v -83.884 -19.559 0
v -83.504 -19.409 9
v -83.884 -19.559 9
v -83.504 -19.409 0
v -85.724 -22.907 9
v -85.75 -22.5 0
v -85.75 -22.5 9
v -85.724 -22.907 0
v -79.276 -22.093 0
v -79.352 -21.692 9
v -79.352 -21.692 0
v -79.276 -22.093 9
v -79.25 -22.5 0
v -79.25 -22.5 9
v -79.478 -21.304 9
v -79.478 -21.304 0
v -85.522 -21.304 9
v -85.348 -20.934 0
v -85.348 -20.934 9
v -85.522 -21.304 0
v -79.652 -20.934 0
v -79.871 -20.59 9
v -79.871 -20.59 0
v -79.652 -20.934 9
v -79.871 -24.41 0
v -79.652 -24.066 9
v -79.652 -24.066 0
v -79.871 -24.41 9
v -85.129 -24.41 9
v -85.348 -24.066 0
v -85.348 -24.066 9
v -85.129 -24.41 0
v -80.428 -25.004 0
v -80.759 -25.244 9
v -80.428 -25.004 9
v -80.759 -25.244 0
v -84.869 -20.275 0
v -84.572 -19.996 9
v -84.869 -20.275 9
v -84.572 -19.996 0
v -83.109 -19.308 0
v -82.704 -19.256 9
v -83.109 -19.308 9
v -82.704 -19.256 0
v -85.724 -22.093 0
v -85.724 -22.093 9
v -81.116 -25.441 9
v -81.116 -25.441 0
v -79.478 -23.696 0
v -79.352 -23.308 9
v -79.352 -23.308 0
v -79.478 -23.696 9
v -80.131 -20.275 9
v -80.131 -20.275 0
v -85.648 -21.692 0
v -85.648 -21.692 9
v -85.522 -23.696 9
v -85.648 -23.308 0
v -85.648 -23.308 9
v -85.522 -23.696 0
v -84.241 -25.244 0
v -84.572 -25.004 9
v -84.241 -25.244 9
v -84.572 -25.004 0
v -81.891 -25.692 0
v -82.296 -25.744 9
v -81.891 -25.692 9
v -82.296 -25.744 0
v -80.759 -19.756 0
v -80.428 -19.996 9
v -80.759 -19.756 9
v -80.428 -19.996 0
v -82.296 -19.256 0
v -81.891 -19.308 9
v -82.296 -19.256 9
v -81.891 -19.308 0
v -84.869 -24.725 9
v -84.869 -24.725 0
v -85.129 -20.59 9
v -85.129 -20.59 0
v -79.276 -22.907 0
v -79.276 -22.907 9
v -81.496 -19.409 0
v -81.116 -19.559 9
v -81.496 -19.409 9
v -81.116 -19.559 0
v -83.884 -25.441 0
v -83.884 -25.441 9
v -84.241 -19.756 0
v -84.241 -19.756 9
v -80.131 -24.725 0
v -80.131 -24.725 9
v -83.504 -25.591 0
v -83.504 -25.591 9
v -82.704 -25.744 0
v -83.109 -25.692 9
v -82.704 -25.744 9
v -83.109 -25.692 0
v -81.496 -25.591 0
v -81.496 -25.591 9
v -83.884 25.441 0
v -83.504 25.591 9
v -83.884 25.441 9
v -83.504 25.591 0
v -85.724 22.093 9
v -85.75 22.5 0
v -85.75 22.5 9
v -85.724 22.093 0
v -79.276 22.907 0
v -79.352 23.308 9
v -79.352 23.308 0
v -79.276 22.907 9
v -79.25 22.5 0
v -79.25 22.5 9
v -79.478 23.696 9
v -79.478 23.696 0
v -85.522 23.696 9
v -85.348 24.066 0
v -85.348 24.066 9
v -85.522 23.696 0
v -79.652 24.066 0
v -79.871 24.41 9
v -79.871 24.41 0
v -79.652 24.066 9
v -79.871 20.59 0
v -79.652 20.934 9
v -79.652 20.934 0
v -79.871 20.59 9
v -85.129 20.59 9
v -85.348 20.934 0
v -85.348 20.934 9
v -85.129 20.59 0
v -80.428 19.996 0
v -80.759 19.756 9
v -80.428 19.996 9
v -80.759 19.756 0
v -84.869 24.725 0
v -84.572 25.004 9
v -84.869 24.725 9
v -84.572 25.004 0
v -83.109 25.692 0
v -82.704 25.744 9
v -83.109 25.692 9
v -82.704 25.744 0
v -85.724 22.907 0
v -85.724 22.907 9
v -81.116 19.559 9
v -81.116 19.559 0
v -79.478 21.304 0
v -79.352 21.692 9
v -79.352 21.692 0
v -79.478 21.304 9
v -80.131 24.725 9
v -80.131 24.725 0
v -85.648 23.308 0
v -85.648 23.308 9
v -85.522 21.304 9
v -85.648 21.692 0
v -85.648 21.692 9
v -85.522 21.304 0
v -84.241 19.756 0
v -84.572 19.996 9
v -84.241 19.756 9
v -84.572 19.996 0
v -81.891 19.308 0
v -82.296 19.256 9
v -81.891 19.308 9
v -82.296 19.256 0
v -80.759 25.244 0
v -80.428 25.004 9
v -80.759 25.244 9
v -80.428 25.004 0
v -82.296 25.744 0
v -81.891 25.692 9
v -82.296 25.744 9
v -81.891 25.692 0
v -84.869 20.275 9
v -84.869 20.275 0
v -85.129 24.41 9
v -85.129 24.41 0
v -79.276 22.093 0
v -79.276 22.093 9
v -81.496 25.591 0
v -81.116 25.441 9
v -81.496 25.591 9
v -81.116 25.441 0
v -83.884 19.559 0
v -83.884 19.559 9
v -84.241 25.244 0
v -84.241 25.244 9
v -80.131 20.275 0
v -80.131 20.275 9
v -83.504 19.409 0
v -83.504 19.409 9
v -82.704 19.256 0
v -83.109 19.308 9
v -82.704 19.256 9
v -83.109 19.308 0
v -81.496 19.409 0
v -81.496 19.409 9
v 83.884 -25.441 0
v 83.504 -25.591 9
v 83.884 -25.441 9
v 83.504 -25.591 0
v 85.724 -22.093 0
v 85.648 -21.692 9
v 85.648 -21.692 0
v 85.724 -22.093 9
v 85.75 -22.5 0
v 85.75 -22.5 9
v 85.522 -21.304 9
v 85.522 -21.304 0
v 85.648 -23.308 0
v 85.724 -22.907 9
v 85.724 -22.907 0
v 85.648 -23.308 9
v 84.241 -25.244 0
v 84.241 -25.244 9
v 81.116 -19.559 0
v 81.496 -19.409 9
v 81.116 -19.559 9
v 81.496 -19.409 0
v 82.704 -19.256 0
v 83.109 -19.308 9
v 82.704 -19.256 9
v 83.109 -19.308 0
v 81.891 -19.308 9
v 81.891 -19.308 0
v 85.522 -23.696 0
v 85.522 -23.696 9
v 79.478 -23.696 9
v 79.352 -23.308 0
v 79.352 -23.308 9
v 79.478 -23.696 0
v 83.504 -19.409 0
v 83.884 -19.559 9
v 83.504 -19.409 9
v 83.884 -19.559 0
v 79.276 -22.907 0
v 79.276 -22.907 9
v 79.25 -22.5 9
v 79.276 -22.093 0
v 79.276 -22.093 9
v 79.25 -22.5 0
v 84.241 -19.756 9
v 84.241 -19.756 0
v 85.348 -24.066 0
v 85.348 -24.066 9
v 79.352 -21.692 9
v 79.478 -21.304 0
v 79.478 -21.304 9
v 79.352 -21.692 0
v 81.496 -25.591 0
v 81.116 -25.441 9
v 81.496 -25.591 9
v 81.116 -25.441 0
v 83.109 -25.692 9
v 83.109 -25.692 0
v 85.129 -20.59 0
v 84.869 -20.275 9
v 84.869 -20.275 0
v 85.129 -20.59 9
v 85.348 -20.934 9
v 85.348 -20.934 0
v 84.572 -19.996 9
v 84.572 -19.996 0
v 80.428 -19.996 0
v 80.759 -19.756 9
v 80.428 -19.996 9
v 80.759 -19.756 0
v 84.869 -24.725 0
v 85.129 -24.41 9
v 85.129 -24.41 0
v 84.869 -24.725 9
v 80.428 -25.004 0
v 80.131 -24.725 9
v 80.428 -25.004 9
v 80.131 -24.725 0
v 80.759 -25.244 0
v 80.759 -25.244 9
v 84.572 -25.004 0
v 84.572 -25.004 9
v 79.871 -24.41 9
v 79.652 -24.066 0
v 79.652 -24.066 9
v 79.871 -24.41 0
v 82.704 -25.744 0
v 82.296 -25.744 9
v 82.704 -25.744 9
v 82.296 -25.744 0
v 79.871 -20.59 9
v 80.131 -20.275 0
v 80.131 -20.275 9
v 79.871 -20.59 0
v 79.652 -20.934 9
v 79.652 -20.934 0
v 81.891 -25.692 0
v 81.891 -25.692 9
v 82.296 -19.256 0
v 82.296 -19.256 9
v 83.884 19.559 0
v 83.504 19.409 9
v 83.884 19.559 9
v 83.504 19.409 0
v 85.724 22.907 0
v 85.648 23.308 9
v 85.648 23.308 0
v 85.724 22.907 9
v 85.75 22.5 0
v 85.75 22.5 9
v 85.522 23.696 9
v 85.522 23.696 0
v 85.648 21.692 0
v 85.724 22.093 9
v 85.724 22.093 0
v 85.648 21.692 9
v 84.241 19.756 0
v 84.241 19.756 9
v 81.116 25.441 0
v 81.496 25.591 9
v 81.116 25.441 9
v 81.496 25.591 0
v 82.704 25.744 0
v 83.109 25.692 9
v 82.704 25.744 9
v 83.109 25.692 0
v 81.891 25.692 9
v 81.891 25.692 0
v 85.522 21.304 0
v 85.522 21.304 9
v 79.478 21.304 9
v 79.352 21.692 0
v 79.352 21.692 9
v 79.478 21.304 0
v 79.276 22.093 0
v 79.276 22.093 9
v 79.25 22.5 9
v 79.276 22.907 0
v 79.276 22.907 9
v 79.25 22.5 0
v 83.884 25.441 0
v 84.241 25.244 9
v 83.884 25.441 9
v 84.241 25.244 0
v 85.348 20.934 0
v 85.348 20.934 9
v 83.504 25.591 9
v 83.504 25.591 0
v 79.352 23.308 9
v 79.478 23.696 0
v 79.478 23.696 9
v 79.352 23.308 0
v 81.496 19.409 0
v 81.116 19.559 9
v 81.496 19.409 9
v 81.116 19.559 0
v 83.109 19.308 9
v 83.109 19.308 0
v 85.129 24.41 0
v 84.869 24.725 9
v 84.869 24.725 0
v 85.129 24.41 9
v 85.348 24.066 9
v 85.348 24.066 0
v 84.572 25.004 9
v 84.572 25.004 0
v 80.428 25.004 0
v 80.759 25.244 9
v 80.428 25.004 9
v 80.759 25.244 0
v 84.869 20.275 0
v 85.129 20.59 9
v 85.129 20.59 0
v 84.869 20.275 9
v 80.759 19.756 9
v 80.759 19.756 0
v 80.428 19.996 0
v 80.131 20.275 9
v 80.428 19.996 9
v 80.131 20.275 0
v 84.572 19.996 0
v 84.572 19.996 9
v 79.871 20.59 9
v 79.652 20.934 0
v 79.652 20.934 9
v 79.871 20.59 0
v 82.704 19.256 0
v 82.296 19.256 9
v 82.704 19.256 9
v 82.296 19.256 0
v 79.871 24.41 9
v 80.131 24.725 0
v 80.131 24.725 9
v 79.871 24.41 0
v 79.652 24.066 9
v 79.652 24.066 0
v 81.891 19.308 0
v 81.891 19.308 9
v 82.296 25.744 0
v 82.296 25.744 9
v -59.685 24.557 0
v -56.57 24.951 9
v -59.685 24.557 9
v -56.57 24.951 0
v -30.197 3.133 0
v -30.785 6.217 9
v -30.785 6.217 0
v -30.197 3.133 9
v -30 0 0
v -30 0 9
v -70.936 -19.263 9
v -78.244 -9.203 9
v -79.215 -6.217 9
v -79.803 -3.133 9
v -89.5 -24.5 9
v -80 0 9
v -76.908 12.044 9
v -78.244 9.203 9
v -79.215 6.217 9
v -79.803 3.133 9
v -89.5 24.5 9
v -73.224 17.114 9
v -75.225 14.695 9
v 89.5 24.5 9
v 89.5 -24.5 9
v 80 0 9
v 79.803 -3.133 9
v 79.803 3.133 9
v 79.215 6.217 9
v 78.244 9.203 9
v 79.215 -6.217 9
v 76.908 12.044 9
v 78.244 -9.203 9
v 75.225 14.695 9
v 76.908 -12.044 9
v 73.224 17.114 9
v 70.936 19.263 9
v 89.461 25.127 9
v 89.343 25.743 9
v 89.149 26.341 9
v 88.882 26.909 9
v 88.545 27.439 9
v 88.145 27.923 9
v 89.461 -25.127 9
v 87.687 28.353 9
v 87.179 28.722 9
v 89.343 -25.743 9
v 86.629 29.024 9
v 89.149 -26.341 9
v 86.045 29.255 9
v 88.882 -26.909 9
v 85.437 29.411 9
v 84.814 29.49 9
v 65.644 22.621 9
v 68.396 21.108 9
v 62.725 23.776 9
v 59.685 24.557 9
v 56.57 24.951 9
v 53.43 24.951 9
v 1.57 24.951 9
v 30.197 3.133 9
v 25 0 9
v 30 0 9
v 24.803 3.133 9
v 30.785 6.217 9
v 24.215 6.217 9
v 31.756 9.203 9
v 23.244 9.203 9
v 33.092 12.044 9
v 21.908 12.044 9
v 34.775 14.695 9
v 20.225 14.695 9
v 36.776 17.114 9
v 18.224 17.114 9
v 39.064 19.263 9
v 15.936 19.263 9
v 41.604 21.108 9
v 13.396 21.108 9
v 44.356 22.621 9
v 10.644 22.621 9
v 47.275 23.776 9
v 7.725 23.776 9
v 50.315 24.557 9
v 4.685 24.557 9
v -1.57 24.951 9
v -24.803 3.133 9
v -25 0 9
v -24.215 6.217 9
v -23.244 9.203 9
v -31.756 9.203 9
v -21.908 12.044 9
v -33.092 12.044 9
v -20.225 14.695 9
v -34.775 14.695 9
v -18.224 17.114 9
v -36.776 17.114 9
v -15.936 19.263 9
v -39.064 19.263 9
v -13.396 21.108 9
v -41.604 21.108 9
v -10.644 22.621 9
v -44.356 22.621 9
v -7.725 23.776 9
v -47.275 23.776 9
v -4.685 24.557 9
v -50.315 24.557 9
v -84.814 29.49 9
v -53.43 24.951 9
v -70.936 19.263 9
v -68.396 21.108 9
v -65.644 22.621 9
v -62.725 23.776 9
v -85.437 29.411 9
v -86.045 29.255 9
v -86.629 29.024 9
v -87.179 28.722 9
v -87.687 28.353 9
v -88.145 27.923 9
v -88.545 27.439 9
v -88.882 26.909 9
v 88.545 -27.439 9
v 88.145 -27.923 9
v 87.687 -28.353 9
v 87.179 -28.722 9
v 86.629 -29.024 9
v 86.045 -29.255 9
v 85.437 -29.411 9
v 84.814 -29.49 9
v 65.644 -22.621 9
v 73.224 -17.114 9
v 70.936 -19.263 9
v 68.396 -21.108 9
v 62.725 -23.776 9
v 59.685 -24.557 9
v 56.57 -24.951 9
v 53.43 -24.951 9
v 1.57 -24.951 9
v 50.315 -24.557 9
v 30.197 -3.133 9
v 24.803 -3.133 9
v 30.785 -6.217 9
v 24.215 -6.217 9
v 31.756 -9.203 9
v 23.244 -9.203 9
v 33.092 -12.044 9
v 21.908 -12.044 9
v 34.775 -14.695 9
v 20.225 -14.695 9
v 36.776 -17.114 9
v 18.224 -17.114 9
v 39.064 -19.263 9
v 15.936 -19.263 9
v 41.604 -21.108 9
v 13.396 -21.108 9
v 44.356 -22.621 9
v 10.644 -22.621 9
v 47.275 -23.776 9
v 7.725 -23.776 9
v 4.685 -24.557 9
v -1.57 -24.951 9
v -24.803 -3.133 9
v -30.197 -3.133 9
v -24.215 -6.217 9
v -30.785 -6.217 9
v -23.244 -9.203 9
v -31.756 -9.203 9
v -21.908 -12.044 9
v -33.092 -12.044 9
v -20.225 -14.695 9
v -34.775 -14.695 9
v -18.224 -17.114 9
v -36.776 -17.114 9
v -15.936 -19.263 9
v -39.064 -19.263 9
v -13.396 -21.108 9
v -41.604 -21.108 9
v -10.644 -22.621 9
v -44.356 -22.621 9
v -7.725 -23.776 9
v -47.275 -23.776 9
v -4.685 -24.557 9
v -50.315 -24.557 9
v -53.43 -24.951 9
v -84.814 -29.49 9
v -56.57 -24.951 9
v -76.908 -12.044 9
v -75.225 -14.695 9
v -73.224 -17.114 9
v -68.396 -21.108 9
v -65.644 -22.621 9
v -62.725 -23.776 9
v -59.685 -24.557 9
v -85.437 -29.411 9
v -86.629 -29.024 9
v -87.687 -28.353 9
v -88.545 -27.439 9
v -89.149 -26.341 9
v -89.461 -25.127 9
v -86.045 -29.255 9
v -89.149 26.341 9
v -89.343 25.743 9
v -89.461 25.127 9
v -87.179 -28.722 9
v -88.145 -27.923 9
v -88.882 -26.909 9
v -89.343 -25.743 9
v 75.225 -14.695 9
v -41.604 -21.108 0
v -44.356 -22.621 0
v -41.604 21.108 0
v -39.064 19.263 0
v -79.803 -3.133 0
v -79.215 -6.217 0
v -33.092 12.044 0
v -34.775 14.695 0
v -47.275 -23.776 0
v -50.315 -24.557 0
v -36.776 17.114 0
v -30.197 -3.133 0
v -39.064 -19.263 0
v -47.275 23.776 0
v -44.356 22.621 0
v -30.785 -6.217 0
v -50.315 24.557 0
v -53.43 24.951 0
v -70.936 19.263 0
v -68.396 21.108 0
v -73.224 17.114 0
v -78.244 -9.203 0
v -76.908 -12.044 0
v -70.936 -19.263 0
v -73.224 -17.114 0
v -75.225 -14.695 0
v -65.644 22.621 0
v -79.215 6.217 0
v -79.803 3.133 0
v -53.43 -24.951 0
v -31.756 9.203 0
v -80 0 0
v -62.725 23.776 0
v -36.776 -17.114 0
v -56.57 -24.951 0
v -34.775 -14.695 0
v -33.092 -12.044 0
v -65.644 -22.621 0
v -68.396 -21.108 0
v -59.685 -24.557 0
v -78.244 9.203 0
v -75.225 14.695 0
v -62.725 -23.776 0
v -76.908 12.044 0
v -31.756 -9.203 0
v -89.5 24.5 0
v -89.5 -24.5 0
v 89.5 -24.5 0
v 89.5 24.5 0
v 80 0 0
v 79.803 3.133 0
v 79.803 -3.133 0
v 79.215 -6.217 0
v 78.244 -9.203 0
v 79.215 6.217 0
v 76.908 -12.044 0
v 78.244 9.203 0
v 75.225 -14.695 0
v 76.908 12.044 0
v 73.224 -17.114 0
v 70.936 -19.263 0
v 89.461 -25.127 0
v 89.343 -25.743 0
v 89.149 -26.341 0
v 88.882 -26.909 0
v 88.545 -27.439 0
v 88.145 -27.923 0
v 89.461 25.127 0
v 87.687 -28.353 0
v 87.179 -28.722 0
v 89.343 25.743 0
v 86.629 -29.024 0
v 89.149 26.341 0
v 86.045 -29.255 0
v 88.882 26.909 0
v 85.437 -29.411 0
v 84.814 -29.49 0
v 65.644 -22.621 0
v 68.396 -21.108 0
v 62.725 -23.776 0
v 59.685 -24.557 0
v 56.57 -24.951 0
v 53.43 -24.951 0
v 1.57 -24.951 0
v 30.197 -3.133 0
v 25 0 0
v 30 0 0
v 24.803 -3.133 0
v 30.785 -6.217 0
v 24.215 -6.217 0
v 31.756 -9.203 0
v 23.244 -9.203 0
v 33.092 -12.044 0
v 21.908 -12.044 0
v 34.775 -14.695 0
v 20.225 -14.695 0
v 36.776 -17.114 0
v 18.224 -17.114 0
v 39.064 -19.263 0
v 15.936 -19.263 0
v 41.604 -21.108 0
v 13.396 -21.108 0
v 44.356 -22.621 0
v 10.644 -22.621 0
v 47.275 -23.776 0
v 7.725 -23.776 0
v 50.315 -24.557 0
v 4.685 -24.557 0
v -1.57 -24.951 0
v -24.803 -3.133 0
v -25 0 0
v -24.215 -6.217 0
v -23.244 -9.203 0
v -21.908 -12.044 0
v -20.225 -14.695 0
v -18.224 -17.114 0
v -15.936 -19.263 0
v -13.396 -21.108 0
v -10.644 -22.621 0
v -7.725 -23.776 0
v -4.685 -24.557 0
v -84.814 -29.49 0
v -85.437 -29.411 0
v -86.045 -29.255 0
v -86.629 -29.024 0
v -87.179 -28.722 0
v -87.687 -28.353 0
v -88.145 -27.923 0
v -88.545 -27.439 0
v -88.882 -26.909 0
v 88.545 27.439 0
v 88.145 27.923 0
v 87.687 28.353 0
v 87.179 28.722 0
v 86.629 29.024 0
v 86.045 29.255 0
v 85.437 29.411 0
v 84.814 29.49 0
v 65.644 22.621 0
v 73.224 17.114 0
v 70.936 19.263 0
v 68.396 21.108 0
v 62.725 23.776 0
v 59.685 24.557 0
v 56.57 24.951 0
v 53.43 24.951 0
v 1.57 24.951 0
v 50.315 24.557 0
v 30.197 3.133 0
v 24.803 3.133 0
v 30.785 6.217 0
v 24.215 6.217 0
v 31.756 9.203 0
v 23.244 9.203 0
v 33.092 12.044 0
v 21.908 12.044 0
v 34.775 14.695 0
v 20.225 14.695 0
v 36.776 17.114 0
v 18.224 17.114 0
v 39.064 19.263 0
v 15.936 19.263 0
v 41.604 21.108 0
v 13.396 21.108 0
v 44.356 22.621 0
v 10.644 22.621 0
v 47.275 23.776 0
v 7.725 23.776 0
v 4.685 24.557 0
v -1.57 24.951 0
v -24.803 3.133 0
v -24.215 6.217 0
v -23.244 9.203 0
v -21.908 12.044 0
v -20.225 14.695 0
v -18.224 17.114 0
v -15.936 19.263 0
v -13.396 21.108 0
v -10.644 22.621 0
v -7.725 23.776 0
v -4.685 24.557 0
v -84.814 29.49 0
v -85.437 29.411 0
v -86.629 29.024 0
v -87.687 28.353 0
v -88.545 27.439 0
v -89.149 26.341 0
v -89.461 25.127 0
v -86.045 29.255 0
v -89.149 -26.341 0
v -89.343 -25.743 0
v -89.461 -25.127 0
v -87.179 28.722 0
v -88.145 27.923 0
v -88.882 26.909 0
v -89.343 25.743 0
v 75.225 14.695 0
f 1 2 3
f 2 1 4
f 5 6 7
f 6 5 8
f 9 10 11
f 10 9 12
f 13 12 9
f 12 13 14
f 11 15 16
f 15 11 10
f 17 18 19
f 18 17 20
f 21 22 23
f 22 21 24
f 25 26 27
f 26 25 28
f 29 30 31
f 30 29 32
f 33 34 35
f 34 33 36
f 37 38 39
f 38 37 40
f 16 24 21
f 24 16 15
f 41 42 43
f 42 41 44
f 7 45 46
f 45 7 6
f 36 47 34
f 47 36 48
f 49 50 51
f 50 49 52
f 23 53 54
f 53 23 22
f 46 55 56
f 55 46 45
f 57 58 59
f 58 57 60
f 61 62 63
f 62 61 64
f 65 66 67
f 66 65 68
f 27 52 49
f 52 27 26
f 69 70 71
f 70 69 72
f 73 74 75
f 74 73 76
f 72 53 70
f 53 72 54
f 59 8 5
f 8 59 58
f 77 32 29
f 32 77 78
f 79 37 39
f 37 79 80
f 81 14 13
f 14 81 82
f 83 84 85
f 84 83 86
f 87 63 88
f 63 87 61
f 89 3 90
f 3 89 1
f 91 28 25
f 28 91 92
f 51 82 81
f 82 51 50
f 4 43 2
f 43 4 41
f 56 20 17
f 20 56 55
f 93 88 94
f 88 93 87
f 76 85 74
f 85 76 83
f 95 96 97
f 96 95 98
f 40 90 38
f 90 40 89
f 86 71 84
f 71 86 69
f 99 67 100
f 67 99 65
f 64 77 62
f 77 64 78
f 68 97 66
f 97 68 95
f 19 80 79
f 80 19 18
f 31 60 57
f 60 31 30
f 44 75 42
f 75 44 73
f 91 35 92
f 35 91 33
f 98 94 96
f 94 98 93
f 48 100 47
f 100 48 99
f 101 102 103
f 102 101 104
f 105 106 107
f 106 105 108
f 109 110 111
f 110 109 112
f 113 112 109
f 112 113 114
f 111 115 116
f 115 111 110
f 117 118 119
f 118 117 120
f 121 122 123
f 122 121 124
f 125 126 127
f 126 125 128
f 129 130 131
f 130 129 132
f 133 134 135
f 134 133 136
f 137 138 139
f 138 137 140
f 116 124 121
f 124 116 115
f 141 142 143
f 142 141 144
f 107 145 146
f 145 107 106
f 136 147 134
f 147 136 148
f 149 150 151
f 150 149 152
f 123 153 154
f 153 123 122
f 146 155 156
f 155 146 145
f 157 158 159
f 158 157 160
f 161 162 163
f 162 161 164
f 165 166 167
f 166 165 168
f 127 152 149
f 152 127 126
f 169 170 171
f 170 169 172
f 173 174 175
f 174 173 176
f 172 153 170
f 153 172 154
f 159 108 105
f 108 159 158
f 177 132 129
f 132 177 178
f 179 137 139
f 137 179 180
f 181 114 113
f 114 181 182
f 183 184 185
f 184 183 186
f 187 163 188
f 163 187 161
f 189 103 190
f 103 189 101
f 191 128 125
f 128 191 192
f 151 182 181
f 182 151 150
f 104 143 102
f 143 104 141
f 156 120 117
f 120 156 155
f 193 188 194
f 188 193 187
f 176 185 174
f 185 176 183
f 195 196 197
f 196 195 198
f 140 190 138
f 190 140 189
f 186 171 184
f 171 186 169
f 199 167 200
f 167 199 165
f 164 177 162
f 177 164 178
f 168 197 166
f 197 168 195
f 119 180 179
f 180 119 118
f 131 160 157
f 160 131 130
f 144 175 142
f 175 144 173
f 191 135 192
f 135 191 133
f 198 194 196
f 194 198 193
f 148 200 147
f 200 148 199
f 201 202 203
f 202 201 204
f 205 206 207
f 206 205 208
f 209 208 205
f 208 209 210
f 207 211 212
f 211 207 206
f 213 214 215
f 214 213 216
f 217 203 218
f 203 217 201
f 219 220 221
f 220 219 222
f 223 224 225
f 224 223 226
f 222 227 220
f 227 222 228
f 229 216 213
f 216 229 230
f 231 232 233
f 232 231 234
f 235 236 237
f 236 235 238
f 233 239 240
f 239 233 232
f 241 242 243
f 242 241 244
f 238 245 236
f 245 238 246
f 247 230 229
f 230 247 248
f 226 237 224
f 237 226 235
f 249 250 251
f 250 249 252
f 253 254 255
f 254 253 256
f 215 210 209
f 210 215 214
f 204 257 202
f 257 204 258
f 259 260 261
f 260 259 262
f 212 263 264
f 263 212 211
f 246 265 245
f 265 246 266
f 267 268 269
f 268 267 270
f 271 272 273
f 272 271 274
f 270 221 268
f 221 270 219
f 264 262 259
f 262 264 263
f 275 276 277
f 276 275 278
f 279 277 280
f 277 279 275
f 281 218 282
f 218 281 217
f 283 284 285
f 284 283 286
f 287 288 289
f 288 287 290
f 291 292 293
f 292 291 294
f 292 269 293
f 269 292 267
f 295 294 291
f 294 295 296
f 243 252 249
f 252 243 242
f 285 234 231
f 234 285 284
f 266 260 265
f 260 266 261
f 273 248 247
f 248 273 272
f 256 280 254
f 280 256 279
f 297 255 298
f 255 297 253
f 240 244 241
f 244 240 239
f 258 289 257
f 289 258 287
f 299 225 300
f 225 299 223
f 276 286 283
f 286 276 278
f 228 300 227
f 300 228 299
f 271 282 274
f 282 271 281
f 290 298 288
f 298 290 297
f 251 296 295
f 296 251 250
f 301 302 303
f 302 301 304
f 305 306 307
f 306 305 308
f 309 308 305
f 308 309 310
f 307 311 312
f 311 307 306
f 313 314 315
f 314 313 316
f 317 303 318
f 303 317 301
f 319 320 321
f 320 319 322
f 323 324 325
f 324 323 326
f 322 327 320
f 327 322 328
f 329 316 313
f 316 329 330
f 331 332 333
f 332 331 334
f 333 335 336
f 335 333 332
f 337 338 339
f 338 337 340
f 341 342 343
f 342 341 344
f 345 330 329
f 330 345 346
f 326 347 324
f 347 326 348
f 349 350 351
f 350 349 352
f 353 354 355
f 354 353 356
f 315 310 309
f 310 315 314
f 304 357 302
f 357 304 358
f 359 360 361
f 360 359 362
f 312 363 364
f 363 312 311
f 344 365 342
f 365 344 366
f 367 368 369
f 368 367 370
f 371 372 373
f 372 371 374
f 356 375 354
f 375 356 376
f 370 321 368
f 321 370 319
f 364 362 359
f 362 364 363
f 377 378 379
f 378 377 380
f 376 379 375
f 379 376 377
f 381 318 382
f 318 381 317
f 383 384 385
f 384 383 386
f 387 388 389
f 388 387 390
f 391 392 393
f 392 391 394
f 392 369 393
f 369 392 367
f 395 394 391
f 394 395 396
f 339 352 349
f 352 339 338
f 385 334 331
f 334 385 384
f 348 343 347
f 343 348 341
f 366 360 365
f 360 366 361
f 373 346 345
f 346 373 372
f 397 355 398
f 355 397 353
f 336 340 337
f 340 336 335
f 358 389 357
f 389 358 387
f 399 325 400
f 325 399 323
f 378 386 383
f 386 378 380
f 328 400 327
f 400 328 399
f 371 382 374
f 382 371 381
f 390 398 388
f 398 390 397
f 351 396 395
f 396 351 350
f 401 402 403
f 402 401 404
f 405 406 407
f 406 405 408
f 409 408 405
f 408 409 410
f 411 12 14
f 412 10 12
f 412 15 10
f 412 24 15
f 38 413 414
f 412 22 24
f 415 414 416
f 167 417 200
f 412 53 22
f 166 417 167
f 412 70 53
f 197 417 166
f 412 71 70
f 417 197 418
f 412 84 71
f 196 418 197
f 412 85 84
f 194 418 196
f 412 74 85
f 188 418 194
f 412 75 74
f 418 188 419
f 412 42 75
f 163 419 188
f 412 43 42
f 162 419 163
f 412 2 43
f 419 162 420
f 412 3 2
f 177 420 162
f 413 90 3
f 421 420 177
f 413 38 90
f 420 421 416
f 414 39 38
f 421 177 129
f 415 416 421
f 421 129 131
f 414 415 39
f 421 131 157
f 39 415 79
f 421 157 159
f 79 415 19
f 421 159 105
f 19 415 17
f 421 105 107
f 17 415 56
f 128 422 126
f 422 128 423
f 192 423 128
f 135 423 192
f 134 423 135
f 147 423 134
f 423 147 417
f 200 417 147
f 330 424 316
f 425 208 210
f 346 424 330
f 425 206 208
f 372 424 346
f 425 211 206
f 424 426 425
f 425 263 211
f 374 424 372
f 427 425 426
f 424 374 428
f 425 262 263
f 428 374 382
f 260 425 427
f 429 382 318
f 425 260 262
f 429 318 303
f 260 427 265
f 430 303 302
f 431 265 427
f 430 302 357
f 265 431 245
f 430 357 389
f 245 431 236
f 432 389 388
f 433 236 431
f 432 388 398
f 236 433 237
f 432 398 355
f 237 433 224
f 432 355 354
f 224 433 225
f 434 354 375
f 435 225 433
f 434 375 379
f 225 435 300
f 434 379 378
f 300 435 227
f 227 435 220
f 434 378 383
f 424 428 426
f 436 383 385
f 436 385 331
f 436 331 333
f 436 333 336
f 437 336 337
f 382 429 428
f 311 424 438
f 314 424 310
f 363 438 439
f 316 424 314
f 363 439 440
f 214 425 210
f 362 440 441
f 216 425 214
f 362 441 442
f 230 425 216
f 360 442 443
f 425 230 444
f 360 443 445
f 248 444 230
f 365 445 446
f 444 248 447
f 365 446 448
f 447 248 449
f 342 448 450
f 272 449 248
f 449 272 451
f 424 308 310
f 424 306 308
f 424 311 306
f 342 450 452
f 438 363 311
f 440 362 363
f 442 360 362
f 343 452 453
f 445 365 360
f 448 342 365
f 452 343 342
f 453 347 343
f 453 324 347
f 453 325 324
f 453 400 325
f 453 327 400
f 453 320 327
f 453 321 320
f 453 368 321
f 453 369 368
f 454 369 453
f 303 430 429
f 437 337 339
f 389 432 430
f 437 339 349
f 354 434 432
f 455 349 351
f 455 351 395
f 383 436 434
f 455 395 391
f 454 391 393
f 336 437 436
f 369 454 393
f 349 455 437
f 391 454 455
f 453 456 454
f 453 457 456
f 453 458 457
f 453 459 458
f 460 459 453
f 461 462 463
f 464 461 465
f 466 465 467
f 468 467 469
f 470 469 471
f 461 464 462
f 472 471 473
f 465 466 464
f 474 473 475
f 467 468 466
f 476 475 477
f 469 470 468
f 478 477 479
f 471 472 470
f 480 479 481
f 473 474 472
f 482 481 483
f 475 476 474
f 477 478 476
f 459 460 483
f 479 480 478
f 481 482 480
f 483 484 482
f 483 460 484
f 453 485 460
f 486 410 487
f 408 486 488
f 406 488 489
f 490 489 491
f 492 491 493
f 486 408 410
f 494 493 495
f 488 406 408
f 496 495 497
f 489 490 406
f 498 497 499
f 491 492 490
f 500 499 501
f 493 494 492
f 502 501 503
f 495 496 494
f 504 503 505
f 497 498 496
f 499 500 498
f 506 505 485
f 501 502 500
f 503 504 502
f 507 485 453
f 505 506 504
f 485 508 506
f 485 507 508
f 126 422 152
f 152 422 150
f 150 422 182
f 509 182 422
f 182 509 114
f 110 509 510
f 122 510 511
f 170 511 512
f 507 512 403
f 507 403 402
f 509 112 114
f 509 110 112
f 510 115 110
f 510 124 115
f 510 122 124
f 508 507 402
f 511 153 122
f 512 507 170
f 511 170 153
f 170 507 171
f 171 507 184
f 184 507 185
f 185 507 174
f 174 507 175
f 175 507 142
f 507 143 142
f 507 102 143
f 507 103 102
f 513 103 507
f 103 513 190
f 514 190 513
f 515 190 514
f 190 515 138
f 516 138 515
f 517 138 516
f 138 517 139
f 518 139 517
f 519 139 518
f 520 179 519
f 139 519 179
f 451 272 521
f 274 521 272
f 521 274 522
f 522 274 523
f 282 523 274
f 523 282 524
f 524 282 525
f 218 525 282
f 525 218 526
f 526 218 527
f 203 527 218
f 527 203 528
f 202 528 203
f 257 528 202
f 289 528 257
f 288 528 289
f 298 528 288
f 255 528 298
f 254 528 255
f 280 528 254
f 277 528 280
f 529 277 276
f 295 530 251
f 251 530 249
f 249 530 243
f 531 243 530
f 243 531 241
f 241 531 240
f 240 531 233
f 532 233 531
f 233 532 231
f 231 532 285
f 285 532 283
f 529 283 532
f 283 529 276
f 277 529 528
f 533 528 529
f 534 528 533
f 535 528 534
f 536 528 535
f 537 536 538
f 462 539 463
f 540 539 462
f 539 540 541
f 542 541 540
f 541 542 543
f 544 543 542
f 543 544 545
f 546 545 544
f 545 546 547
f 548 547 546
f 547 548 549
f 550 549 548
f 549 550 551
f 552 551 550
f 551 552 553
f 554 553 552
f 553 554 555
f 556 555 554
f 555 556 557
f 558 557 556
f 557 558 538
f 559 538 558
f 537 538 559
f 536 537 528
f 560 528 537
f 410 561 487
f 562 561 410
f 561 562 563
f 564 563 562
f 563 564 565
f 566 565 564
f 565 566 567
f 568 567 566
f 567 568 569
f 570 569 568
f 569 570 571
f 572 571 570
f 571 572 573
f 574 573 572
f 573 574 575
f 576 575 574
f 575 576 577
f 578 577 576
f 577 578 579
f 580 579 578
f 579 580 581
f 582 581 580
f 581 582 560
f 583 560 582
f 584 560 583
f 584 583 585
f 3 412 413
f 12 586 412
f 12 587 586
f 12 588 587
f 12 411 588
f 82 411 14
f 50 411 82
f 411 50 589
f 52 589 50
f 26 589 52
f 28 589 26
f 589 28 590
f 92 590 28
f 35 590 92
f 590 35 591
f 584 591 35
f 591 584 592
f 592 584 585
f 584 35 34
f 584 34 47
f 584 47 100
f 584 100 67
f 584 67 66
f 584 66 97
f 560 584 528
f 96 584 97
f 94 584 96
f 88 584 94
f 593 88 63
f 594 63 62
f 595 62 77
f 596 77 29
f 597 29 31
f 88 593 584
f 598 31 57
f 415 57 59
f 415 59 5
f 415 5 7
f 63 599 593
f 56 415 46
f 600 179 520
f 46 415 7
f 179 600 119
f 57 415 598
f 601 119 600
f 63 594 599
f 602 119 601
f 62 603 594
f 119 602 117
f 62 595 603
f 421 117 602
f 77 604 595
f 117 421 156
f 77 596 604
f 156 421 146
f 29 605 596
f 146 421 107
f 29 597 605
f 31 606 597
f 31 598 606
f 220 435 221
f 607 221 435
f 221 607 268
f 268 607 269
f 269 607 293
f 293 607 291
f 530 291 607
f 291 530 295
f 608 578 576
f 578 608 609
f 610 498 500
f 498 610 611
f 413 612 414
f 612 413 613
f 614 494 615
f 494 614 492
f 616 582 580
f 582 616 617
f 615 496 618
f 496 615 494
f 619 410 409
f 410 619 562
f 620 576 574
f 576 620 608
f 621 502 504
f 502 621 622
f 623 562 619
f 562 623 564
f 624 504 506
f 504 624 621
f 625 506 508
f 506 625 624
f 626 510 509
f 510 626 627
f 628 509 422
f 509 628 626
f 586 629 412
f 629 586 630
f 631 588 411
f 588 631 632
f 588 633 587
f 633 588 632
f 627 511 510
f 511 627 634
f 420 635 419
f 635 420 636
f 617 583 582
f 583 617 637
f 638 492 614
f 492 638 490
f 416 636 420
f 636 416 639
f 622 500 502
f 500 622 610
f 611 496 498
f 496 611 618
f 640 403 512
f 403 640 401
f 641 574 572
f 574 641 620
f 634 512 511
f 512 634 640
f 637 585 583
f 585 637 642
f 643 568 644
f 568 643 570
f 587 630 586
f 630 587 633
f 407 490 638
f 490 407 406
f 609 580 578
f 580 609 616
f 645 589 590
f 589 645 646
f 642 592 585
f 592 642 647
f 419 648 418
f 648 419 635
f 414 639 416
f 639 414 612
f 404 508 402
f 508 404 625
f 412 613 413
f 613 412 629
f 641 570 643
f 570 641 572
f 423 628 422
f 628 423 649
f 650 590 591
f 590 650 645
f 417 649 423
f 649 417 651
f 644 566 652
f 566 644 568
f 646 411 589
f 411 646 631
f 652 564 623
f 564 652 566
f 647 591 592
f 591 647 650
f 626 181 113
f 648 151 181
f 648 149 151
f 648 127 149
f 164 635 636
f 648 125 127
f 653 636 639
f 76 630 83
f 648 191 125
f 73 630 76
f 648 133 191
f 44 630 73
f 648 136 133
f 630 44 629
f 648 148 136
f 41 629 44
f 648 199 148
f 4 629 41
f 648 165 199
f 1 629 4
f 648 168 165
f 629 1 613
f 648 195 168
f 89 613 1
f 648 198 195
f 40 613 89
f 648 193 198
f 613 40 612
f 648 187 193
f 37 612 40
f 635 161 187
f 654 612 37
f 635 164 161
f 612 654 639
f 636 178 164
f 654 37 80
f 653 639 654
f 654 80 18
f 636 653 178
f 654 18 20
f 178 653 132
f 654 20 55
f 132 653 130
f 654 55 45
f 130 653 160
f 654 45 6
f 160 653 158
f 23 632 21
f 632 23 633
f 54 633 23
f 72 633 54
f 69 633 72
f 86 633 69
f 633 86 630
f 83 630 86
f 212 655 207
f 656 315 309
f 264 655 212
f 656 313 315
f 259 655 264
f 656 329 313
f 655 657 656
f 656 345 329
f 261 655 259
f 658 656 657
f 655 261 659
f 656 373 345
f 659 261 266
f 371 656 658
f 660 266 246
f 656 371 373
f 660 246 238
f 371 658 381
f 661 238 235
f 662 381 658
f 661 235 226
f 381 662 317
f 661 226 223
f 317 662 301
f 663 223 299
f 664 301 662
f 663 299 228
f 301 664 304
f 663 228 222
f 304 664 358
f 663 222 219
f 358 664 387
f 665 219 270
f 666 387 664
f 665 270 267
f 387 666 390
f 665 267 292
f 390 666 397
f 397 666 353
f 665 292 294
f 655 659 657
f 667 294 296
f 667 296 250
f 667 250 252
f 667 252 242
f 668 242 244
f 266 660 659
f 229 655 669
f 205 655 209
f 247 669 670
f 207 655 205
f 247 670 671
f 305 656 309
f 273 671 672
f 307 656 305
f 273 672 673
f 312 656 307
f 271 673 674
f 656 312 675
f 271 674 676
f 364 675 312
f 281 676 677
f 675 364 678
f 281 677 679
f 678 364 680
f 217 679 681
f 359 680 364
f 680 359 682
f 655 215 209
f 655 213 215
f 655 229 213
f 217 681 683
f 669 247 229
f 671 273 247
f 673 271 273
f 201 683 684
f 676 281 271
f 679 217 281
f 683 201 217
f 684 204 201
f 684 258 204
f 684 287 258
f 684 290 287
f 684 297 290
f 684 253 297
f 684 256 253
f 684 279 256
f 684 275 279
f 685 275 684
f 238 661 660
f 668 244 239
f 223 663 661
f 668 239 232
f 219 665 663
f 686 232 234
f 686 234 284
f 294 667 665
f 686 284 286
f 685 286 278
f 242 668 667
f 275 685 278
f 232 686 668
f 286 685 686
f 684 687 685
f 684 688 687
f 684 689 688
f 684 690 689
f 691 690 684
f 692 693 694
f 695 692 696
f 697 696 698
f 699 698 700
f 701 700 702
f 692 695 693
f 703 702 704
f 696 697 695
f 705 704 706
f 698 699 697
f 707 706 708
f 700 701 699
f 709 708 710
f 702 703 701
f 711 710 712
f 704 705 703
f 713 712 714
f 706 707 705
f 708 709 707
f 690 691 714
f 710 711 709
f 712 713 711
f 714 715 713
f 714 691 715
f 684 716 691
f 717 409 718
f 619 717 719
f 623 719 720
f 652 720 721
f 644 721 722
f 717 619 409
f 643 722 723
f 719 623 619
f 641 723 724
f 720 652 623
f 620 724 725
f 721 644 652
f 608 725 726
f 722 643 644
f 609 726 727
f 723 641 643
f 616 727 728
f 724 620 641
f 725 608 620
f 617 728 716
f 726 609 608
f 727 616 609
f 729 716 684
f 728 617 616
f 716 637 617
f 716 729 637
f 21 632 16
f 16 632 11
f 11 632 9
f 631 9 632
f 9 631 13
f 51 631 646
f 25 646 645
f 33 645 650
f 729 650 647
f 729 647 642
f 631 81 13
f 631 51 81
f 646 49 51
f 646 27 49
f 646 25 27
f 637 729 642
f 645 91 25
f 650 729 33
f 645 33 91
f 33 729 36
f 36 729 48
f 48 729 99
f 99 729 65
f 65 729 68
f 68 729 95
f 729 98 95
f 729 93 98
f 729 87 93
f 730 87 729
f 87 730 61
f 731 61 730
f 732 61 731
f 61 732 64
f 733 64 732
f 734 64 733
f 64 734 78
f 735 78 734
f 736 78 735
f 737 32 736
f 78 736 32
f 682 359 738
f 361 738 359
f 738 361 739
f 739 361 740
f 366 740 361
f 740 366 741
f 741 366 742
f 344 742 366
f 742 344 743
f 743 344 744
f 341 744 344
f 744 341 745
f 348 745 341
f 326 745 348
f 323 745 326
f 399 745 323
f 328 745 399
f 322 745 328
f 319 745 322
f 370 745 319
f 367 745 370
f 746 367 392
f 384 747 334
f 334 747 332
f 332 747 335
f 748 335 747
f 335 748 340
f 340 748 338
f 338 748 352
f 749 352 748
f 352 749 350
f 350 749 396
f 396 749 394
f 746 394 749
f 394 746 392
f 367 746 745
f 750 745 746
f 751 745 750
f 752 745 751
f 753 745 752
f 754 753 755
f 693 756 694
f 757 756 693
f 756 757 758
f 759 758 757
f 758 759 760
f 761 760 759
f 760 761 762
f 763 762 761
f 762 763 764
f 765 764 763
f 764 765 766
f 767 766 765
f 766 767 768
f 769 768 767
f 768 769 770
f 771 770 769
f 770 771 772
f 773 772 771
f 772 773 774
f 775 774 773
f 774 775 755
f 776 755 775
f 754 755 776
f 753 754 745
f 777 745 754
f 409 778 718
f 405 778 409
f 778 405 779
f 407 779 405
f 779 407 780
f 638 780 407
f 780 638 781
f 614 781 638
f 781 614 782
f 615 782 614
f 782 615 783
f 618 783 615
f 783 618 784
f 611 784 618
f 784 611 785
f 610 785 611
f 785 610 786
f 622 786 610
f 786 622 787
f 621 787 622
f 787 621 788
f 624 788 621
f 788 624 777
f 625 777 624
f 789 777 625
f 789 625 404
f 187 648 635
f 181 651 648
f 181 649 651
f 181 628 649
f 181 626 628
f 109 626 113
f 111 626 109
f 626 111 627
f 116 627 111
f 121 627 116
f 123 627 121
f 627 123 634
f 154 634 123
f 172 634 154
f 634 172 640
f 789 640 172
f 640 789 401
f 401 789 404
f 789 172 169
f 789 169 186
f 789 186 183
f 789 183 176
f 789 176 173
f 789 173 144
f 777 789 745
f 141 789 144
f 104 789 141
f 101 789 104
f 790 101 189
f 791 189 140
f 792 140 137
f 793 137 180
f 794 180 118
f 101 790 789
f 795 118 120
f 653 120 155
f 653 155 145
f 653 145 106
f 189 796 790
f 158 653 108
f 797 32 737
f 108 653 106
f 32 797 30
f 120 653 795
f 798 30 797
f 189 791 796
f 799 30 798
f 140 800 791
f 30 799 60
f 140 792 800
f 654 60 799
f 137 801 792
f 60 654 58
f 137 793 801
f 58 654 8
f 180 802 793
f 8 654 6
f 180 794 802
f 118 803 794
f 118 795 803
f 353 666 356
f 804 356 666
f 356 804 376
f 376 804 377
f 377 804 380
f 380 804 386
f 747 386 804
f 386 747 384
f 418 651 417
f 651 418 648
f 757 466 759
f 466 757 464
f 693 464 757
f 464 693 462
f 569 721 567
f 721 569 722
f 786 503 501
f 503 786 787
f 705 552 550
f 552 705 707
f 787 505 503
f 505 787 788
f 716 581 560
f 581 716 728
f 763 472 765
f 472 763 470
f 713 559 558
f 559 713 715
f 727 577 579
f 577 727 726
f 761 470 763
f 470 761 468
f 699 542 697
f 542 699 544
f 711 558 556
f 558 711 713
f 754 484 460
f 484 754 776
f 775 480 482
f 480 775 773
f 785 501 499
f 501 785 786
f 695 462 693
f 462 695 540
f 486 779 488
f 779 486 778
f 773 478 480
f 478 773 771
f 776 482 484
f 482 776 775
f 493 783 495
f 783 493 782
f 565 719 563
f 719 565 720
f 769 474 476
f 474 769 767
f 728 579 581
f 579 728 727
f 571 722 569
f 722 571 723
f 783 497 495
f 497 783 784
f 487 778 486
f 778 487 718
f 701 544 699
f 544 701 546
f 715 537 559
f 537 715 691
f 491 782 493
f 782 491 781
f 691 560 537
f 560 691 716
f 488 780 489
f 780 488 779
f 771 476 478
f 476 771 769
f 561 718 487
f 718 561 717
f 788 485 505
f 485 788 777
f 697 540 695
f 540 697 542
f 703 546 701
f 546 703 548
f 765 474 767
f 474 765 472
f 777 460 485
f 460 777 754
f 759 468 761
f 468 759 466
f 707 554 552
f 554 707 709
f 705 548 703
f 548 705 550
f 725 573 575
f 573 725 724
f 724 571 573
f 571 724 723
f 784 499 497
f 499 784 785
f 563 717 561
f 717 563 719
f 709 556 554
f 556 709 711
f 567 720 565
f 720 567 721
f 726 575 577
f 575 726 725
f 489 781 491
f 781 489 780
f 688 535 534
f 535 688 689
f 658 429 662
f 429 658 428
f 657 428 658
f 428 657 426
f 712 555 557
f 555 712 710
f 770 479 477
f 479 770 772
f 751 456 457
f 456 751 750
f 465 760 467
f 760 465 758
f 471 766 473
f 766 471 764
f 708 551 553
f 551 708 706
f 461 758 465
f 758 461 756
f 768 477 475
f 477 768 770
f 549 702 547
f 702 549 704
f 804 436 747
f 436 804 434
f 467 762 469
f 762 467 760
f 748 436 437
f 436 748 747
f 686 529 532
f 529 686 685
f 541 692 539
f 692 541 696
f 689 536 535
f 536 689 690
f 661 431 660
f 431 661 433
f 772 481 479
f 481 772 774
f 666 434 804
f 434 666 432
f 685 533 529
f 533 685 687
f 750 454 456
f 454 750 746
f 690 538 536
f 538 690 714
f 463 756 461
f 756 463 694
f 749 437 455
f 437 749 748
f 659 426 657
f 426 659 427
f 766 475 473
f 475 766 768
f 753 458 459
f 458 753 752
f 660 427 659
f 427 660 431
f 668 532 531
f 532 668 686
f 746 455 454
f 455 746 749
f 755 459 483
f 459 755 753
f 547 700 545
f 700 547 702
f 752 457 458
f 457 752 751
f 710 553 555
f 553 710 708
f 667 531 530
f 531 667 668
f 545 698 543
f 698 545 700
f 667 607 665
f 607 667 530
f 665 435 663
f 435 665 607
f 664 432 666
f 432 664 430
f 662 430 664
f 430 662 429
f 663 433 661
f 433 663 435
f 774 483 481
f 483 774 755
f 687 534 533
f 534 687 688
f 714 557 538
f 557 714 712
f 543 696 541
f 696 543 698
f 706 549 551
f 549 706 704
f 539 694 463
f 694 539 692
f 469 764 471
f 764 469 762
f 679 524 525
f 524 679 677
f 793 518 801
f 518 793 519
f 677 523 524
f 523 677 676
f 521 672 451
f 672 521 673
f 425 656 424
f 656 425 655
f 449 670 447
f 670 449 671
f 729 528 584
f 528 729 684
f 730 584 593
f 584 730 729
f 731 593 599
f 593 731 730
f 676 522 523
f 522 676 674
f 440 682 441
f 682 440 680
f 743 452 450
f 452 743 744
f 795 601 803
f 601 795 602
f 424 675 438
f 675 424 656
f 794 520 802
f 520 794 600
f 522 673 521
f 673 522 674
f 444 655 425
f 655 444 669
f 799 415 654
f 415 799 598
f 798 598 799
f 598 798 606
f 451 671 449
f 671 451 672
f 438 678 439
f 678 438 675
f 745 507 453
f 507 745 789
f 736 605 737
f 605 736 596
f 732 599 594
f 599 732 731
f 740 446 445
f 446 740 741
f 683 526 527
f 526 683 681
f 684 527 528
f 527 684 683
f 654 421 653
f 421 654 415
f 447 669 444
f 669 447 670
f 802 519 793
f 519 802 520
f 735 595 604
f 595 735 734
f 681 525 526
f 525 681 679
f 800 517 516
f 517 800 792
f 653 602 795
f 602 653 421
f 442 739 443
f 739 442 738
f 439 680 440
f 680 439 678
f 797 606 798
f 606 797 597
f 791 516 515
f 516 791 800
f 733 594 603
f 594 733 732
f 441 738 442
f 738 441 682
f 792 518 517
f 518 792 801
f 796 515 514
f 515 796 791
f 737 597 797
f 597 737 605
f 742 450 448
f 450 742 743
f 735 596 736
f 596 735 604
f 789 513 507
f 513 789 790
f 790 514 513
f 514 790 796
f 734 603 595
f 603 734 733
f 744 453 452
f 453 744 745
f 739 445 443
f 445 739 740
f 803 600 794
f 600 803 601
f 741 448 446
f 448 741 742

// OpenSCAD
$fn = 50;


difference() {
	union() {
		hull() {
			translate(v = [-84.5000000000, 24.5000000000, 0]) {
				cylinder(h = 9, r = 5);
			}
			translate(v = [84.5000000000, 24.5000000000, 0]) {
				cylinder(h = 9, r = 5);
			}
			translate(v = [-84.5000000000, -24.5000000000, 0]) {
				cylinder(h = 9, r = 5);
			}
			translate(v = [84.5000000000, -24.5000000000, 0]) {
				cylinder(h = 9, r = 5);
			}
		}
	}
	union() {
		#translate(v = [-82.5000000000, -22.5000000000, -100.0000000000]) {
			cylinder(h = 200, r = 3.2500000000);
		}
		#translate(v = [-82.5000000000, 22.5000000000, -100.0000000000]) {
			cylinder(h = 200, r = 3.2500000000);
		}
		#translate(v = [82.5000000000, -22.5000000000, -100.0000000000]) {
			cylinder(h = 200, r = 3.2500000000);
		}
		#translate(v = [82.5000000000, 22.5000000000, -100.0000000000]) {
			cylinder(h = 200, r = 3.2500000000);
		}
		#translate(v = [-55.0000000000, 0, 0]) {
			cylinder(h = 9, r = 25.0000000000);
		}
		#cylinder(h = 9, r = 25.0000000000);
		#translate(v = [55.0000000000, 0, 0]) {
			cylinder(h = 9, r = 25.0000000000);
		}
	}
}
